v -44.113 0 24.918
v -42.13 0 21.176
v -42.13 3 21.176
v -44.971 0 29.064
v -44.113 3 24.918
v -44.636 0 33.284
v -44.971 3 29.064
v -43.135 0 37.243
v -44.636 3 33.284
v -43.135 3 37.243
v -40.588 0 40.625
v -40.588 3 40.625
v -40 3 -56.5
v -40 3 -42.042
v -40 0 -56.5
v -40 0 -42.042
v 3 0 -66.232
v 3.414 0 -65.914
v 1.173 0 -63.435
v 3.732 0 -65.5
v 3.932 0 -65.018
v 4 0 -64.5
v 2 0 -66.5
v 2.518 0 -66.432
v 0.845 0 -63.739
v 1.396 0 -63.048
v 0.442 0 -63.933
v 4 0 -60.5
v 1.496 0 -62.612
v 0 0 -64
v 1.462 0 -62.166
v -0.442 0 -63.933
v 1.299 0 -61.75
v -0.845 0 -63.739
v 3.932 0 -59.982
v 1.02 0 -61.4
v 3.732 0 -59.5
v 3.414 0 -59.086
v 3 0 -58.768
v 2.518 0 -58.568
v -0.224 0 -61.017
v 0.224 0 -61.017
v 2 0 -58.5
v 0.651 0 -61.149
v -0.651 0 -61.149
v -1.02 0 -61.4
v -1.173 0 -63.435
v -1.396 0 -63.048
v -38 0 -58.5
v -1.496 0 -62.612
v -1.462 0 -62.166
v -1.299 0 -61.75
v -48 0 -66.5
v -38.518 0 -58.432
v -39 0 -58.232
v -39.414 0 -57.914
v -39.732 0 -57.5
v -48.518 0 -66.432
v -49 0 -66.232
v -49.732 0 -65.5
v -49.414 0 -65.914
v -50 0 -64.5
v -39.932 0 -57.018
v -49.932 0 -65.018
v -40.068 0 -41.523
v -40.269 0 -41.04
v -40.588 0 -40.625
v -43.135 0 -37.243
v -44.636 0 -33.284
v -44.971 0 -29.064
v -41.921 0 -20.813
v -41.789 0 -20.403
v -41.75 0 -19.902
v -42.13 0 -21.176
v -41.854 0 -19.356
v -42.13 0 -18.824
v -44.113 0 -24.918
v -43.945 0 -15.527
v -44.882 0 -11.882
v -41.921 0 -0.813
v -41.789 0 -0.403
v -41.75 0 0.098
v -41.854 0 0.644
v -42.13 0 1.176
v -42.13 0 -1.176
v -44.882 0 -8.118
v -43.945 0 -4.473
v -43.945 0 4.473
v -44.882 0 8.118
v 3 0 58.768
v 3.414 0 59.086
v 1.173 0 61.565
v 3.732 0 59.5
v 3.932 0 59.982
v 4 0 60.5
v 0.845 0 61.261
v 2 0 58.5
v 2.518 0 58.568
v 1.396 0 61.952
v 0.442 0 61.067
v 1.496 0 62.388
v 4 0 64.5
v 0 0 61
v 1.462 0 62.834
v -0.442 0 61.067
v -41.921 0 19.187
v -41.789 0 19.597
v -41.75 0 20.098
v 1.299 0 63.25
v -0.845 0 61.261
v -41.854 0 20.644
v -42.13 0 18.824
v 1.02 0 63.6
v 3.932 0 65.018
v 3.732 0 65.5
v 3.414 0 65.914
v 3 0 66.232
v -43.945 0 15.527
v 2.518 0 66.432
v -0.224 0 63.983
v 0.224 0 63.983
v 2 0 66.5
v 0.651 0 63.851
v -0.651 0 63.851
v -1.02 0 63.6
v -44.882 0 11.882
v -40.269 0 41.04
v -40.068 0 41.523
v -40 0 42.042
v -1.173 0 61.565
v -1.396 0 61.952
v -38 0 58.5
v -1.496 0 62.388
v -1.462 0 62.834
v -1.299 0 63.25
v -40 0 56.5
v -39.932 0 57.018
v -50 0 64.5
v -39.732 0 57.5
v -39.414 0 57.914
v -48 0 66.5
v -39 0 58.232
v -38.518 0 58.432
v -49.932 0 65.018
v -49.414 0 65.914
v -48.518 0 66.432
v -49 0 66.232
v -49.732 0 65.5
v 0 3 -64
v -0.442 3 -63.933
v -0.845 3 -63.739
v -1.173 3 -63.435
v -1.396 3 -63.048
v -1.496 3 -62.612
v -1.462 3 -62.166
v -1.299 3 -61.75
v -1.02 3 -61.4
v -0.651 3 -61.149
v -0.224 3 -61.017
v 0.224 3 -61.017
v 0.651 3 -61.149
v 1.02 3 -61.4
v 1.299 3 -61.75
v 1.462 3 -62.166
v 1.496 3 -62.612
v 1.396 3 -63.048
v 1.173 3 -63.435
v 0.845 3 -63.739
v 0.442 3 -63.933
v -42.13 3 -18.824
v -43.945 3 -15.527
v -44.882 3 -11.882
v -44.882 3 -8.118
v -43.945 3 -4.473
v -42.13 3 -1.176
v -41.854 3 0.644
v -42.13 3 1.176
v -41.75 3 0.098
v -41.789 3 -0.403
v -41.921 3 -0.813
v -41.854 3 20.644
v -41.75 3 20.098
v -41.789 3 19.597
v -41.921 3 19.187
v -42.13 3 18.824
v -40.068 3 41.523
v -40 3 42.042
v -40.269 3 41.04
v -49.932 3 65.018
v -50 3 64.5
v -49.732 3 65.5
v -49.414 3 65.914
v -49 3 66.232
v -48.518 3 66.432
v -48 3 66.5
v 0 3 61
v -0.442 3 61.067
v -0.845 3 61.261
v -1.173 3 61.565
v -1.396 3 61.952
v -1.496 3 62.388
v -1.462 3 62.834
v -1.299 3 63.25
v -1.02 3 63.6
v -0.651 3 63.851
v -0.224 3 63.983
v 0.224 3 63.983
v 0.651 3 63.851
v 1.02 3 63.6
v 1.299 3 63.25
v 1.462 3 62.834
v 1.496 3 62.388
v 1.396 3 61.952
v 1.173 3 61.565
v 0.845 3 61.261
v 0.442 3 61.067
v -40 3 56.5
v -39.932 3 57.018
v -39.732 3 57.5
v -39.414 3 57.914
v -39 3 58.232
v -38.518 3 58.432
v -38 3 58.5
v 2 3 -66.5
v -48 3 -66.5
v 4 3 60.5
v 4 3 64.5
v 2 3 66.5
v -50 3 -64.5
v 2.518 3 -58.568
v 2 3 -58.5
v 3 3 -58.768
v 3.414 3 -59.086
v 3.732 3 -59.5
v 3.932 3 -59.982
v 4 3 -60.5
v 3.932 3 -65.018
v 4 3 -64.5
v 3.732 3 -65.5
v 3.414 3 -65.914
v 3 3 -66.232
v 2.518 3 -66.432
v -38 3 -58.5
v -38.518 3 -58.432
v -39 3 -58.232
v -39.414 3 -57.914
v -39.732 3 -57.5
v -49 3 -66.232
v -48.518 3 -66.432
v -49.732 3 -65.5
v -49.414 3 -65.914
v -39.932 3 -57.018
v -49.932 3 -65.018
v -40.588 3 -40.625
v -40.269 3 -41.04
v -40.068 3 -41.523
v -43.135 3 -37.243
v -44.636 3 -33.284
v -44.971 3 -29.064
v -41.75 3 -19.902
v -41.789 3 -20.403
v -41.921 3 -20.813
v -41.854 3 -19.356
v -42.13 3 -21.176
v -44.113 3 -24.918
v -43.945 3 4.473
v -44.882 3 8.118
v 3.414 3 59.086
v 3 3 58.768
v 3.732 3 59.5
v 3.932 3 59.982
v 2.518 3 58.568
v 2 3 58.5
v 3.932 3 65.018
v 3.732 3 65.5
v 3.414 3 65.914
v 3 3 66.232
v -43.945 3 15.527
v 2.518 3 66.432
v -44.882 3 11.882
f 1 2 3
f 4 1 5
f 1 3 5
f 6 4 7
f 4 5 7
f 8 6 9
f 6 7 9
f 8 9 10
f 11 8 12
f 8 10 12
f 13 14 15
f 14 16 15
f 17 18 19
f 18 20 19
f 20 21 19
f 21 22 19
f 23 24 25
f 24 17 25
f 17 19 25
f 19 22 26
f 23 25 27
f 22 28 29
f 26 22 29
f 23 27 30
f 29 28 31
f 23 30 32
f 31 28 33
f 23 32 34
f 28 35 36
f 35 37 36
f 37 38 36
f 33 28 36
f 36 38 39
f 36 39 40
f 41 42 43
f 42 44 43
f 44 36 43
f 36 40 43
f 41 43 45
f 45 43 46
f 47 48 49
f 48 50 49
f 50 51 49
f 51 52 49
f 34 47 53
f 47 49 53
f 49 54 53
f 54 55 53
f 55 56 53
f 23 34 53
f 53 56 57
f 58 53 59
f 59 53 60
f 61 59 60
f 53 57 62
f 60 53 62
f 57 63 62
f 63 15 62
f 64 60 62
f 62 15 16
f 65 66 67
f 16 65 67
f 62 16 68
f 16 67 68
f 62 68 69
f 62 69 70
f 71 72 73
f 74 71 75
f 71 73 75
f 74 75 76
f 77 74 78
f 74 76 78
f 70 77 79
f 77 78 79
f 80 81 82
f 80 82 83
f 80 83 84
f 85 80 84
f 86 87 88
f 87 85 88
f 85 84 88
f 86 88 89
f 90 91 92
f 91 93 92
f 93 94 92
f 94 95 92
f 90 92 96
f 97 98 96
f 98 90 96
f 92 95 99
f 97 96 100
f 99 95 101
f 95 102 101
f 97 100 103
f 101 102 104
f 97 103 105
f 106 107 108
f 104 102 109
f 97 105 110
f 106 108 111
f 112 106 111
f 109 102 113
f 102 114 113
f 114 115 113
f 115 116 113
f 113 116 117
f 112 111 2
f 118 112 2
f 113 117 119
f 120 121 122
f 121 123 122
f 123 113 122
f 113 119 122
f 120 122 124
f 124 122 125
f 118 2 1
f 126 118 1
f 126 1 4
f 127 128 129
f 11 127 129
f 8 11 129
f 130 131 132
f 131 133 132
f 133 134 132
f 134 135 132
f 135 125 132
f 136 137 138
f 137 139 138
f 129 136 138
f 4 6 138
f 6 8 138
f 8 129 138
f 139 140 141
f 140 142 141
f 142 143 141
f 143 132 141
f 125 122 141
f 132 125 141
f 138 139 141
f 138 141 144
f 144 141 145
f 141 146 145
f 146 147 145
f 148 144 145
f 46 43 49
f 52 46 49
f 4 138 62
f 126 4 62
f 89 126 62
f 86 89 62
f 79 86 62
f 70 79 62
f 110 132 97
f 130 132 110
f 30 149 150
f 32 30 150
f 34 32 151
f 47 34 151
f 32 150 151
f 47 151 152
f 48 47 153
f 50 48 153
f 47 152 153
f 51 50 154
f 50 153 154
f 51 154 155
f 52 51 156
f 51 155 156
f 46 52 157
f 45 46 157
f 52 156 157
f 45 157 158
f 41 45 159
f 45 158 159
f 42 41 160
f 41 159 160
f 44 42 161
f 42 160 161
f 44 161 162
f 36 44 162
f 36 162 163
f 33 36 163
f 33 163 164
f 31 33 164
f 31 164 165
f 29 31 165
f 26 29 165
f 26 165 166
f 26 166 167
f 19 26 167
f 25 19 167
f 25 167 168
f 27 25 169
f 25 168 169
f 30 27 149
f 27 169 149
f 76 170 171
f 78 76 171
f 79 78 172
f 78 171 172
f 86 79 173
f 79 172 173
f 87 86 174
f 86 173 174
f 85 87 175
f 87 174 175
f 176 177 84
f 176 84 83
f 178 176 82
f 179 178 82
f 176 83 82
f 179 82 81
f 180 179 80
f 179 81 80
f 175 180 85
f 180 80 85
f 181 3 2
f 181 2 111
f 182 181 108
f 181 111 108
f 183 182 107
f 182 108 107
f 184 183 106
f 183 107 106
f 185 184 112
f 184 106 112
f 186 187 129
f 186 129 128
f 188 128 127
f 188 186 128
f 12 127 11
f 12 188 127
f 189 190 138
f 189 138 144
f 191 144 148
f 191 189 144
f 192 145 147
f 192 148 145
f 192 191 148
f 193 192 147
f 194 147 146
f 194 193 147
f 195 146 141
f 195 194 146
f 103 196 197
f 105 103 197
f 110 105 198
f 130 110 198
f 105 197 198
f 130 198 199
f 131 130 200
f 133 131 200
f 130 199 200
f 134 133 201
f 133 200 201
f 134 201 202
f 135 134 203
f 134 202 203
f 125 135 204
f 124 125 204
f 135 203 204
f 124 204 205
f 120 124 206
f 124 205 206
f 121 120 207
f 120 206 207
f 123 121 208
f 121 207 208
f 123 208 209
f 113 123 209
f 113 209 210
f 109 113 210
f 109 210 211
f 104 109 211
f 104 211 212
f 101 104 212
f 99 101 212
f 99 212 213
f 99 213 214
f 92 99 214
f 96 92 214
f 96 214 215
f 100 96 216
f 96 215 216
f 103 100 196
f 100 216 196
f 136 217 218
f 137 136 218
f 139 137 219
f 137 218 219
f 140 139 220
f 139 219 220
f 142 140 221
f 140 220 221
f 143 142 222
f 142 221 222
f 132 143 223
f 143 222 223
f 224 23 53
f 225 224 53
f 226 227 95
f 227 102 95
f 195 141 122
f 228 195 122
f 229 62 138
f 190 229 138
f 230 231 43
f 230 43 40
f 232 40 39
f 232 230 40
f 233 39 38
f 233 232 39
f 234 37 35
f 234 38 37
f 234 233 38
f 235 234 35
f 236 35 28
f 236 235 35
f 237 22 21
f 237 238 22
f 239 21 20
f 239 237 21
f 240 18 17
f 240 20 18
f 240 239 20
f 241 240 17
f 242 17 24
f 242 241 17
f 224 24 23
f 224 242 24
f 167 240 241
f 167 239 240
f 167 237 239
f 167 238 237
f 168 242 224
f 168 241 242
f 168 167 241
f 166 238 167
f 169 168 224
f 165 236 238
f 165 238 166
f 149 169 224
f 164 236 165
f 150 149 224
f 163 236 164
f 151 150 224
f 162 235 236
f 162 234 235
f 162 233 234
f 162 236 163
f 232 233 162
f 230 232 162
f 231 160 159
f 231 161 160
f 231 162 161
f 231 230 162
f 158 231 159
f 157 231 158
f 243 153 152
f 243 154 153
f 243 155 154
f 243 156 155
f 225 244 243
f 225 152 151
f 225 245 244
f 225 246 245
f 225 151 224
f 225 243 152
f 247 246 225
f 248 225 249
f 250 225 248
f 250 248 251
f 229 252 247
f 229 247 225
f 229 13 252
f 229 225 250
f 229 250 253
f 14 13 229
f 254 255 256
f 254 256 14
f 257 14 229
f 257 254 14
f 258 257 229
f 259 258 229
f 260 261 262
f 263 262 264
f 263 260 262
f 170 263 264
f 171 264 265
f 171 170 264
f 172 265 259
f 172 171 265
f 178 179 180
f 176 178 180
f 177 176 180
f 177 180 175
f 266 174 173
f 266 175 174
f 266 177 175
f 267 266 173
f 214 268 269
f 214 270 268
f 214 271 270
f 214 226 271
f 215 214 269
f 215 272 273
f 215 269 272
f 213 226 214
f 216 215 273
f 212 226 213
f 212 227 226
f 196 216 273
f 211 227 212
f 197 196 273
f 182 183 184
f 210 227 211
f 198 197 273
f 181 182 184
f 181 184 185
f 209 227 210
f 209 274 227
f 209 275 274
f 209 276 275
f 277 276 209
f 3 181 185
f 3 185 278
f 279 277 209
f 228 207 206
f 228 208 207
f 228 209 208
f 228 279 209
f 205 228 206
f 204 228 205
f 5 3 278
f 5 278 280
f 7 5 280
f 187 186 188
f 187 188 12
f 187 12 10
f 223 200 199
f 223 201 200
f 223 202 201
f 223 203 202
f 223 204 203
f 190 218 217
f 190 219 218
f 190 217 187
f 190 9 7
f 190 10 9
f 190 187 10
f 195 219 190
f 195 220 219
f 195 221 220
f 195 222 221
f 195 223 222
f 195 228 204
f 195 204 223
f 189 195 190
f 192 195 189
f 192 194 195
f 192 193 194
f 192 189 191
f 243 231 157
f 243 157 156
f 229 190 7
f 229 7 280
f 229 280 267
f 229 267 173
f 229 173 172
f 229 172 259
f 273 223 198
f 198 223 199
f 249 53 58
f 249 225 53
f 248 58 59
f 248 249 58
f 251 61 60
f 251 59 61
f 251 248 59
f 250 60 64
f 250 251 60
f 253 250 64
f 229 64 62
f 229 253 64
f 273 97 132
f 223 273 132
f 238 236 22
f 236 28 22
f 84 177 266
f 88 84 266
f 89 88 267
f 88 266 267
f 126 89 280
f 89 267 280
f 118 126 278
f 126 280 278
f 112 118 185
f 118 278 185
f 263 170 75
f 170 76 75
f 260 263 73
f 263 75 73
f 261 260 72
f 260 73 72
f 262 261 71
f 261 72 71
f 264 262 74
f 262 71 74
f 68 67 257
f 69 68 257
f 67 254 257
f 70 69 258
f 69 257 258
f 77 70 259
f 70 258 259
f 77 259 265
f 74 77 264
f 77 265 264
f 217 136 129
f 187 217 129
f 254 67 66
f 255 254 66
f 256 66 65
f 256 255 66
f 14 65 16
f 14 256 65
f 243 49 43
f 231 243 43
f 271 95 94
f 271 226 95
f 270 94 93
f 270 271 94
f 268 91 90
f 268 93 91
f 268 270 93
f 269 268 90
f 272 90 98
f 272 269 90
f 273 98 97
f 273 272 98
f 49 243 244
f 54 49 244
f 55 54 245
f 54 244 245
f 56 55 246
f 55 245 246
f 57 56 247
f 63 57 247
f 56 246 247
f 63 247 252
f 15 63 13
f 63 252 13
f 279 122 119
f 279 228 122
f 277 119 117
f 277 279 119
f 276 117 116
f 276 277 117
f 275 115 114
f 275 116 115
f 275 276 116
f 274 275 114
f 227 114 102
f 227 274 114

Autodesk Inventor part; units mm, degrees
ref_plane "YZ Plane" through (0, 0, 0) normal (1, 0, 0) x (0, 1, 0)
ref_plane "XZ Plane" through (0, 0, 0) normal (0, 1, 0) x (-1, 0, 0)
ref_plane "XY Plane" through (0, 0, 0) normal (0, 0, 1) x (1, 0, 0)
sketch "Sketch1" plane through (0, 0, 0) normal (0, 1, 0) x (-1, 0, 0)
  line L0 (0, 0) -> (50, 0) construction
  line L1 (0, 0) -> (0, -62.5) construction
  line L2 (0, -62.5) -> (-4, -62.5) construction
  line L3 (40, -58.5) -> (-4, -58.5)
  line L4 (-4, -58.5) -> (-4, -66.5)
  line L5 (-4, -66.5) -> (50, -66.5)
  line L6 (50, -66.5) -> (50, 66.5)
  line L7 (50, 66.5) -> (-4, 66.5)
  line L8 (-4, 66.5) -> (-4, 58.5)
  line L9 (-4, 58.5) -> (40, 58.5)
  line L10 (40, 58.5) -> (40, -58.5)
  point P0 (0, 62.5)
  dimension "d0" = 62.5
  dimension "d1" = 50
  dimension "d2" = 4
  dimension "d3" = 8
  dimension "d4" = 10
extrude "Plate1" add sketch "Sketch1" along normal blind 3
hole "Hole1" at (0, 0, -62.5) at (0, 0, 62.5) direction (0, 1, 0) diameter 3 end through all
sketch "Sketch2" plane through (0, 3, 0) normal (0, 1, 0) x (1, 0, 0)
  circle A0 centre (0, 62.5) radius 1.5 projected
  circle A1 centre (0, -62.5) radius 1.5 projected
  line L0 (-40, 58.5) -> (-40, -58.5) projected
  line L1 (4, 58.5) -> (-40, 58.5) projected
  line L2 (4, 66.5) -> (4, 58.5) projected
  line L3 (-50, 66.5) -> (4, 66.5) projected
  line L4 (-50, -66.5) -> (-50, 66.5) projected
  line L5 (4, -66.5) -> (-50, -66.5) projected
  line L6 (4, -58.5) -> (4, -66.5) projected
  line L7 (-40, -58.5) -> (4, -58.5) projected
  circle A2 centre (-30, -30) radius 15
  circle A3 centre (-30, -10) radius 15
  circle A4 centre (-30, 10) radius 15
  circle A5 centre (-30, 30) radius 15
  line L8 (-30, 30) -> (-30, -30) construction
  line L9 (-30, 30) -> (-30, 58.5) construction
  line L10 (-30, -30) -> (-30, -58.5) construction
  point P0 (0, 0)
  dimension "d13" = 20
  dimension "d14" = 20
  dimension "d15" = 30
  dimension "d16" = 20
  dimension "d17" = 10
extrude "Extrusion1" cut sketch "Sketch2" against normal through all contours A5 A4 L0 | L0 A4 A5 | A4 A5 L0 | L0 A5 A4 | A5 L0 A3 A4 | A5 A4 A3 L0 | A4 L0 A2 A3 | A3 L0 A4 | A3 A4 L0 | A3 L0 A2 | A2 L0 A3 | A4 A3 A2 L0 | A2 A3 L0 | L0 A3 A2
fillet "Fillet1" radius 2 8 edges at (-50, 1.5, 66.5) (-40, 1.5, 58.5) (4, 1.5, 66.5) (4, 1.5, 58.5) (4, 1.5, -58.5) (4, 1.5, -66.5) (-40, 1.5, -58.5) (-50, 1.5, -66.5)
fillet "Fillet2" radius 2 5 edges at (-40, 1.5, 41.1803) (-41.1803, 1.5, 20) (-41.1803, 1.5, 0) (-41.1803, 1.5, -20) (-40, 1.5, -41.1803)
equation "\"d0\" = 0.5 * holes_spacing"
equation "\"d1\" = handle_height"
equation "\"d2\" = hole_2_border"
equation "\"d3\" = 2 * hole_2_border"
equation "\"d4\" = handle_width"
equation "\"d11\" = Thickness"
equation "\"d13\" = finger_trace_width"
equation "\"d14\" = finger_trace_width"
equation "\"d15\" = finger_trace_diameter"
equation "\"d16\" = finger_trace_width"
equation "\"d5\" = Thickness"
equation "\"hole_2_border\" = 4"
equation "\"BendRadius\" = Thickness"
equation "\"BendReliefWidth\" = Thickness"
equation "\"BendReliefDepth\" = 0.5 * Thickness"
equation "\"CornerReliefSize\" = 4 * Thickness"
equation "\"MinimumRemnant\" = 2 * Thickness"
equation "\"TransitionRadius\" = BendRadius"
equation "\"JacobiRadiusSize\" = BendRadius"
equation "\"GapSize\" = Thickness"
equation "\"handle_height\" = 50"
equation "\"handle_width\" = 10"
equation "\"finger_trace_diameter\" = 30"
equation "\"finger_trace_width\" = 20"
equation "\"holes_spacing\" = 125"
equation "\"Thickness\" = 3"
properties part number "handle_v3"
